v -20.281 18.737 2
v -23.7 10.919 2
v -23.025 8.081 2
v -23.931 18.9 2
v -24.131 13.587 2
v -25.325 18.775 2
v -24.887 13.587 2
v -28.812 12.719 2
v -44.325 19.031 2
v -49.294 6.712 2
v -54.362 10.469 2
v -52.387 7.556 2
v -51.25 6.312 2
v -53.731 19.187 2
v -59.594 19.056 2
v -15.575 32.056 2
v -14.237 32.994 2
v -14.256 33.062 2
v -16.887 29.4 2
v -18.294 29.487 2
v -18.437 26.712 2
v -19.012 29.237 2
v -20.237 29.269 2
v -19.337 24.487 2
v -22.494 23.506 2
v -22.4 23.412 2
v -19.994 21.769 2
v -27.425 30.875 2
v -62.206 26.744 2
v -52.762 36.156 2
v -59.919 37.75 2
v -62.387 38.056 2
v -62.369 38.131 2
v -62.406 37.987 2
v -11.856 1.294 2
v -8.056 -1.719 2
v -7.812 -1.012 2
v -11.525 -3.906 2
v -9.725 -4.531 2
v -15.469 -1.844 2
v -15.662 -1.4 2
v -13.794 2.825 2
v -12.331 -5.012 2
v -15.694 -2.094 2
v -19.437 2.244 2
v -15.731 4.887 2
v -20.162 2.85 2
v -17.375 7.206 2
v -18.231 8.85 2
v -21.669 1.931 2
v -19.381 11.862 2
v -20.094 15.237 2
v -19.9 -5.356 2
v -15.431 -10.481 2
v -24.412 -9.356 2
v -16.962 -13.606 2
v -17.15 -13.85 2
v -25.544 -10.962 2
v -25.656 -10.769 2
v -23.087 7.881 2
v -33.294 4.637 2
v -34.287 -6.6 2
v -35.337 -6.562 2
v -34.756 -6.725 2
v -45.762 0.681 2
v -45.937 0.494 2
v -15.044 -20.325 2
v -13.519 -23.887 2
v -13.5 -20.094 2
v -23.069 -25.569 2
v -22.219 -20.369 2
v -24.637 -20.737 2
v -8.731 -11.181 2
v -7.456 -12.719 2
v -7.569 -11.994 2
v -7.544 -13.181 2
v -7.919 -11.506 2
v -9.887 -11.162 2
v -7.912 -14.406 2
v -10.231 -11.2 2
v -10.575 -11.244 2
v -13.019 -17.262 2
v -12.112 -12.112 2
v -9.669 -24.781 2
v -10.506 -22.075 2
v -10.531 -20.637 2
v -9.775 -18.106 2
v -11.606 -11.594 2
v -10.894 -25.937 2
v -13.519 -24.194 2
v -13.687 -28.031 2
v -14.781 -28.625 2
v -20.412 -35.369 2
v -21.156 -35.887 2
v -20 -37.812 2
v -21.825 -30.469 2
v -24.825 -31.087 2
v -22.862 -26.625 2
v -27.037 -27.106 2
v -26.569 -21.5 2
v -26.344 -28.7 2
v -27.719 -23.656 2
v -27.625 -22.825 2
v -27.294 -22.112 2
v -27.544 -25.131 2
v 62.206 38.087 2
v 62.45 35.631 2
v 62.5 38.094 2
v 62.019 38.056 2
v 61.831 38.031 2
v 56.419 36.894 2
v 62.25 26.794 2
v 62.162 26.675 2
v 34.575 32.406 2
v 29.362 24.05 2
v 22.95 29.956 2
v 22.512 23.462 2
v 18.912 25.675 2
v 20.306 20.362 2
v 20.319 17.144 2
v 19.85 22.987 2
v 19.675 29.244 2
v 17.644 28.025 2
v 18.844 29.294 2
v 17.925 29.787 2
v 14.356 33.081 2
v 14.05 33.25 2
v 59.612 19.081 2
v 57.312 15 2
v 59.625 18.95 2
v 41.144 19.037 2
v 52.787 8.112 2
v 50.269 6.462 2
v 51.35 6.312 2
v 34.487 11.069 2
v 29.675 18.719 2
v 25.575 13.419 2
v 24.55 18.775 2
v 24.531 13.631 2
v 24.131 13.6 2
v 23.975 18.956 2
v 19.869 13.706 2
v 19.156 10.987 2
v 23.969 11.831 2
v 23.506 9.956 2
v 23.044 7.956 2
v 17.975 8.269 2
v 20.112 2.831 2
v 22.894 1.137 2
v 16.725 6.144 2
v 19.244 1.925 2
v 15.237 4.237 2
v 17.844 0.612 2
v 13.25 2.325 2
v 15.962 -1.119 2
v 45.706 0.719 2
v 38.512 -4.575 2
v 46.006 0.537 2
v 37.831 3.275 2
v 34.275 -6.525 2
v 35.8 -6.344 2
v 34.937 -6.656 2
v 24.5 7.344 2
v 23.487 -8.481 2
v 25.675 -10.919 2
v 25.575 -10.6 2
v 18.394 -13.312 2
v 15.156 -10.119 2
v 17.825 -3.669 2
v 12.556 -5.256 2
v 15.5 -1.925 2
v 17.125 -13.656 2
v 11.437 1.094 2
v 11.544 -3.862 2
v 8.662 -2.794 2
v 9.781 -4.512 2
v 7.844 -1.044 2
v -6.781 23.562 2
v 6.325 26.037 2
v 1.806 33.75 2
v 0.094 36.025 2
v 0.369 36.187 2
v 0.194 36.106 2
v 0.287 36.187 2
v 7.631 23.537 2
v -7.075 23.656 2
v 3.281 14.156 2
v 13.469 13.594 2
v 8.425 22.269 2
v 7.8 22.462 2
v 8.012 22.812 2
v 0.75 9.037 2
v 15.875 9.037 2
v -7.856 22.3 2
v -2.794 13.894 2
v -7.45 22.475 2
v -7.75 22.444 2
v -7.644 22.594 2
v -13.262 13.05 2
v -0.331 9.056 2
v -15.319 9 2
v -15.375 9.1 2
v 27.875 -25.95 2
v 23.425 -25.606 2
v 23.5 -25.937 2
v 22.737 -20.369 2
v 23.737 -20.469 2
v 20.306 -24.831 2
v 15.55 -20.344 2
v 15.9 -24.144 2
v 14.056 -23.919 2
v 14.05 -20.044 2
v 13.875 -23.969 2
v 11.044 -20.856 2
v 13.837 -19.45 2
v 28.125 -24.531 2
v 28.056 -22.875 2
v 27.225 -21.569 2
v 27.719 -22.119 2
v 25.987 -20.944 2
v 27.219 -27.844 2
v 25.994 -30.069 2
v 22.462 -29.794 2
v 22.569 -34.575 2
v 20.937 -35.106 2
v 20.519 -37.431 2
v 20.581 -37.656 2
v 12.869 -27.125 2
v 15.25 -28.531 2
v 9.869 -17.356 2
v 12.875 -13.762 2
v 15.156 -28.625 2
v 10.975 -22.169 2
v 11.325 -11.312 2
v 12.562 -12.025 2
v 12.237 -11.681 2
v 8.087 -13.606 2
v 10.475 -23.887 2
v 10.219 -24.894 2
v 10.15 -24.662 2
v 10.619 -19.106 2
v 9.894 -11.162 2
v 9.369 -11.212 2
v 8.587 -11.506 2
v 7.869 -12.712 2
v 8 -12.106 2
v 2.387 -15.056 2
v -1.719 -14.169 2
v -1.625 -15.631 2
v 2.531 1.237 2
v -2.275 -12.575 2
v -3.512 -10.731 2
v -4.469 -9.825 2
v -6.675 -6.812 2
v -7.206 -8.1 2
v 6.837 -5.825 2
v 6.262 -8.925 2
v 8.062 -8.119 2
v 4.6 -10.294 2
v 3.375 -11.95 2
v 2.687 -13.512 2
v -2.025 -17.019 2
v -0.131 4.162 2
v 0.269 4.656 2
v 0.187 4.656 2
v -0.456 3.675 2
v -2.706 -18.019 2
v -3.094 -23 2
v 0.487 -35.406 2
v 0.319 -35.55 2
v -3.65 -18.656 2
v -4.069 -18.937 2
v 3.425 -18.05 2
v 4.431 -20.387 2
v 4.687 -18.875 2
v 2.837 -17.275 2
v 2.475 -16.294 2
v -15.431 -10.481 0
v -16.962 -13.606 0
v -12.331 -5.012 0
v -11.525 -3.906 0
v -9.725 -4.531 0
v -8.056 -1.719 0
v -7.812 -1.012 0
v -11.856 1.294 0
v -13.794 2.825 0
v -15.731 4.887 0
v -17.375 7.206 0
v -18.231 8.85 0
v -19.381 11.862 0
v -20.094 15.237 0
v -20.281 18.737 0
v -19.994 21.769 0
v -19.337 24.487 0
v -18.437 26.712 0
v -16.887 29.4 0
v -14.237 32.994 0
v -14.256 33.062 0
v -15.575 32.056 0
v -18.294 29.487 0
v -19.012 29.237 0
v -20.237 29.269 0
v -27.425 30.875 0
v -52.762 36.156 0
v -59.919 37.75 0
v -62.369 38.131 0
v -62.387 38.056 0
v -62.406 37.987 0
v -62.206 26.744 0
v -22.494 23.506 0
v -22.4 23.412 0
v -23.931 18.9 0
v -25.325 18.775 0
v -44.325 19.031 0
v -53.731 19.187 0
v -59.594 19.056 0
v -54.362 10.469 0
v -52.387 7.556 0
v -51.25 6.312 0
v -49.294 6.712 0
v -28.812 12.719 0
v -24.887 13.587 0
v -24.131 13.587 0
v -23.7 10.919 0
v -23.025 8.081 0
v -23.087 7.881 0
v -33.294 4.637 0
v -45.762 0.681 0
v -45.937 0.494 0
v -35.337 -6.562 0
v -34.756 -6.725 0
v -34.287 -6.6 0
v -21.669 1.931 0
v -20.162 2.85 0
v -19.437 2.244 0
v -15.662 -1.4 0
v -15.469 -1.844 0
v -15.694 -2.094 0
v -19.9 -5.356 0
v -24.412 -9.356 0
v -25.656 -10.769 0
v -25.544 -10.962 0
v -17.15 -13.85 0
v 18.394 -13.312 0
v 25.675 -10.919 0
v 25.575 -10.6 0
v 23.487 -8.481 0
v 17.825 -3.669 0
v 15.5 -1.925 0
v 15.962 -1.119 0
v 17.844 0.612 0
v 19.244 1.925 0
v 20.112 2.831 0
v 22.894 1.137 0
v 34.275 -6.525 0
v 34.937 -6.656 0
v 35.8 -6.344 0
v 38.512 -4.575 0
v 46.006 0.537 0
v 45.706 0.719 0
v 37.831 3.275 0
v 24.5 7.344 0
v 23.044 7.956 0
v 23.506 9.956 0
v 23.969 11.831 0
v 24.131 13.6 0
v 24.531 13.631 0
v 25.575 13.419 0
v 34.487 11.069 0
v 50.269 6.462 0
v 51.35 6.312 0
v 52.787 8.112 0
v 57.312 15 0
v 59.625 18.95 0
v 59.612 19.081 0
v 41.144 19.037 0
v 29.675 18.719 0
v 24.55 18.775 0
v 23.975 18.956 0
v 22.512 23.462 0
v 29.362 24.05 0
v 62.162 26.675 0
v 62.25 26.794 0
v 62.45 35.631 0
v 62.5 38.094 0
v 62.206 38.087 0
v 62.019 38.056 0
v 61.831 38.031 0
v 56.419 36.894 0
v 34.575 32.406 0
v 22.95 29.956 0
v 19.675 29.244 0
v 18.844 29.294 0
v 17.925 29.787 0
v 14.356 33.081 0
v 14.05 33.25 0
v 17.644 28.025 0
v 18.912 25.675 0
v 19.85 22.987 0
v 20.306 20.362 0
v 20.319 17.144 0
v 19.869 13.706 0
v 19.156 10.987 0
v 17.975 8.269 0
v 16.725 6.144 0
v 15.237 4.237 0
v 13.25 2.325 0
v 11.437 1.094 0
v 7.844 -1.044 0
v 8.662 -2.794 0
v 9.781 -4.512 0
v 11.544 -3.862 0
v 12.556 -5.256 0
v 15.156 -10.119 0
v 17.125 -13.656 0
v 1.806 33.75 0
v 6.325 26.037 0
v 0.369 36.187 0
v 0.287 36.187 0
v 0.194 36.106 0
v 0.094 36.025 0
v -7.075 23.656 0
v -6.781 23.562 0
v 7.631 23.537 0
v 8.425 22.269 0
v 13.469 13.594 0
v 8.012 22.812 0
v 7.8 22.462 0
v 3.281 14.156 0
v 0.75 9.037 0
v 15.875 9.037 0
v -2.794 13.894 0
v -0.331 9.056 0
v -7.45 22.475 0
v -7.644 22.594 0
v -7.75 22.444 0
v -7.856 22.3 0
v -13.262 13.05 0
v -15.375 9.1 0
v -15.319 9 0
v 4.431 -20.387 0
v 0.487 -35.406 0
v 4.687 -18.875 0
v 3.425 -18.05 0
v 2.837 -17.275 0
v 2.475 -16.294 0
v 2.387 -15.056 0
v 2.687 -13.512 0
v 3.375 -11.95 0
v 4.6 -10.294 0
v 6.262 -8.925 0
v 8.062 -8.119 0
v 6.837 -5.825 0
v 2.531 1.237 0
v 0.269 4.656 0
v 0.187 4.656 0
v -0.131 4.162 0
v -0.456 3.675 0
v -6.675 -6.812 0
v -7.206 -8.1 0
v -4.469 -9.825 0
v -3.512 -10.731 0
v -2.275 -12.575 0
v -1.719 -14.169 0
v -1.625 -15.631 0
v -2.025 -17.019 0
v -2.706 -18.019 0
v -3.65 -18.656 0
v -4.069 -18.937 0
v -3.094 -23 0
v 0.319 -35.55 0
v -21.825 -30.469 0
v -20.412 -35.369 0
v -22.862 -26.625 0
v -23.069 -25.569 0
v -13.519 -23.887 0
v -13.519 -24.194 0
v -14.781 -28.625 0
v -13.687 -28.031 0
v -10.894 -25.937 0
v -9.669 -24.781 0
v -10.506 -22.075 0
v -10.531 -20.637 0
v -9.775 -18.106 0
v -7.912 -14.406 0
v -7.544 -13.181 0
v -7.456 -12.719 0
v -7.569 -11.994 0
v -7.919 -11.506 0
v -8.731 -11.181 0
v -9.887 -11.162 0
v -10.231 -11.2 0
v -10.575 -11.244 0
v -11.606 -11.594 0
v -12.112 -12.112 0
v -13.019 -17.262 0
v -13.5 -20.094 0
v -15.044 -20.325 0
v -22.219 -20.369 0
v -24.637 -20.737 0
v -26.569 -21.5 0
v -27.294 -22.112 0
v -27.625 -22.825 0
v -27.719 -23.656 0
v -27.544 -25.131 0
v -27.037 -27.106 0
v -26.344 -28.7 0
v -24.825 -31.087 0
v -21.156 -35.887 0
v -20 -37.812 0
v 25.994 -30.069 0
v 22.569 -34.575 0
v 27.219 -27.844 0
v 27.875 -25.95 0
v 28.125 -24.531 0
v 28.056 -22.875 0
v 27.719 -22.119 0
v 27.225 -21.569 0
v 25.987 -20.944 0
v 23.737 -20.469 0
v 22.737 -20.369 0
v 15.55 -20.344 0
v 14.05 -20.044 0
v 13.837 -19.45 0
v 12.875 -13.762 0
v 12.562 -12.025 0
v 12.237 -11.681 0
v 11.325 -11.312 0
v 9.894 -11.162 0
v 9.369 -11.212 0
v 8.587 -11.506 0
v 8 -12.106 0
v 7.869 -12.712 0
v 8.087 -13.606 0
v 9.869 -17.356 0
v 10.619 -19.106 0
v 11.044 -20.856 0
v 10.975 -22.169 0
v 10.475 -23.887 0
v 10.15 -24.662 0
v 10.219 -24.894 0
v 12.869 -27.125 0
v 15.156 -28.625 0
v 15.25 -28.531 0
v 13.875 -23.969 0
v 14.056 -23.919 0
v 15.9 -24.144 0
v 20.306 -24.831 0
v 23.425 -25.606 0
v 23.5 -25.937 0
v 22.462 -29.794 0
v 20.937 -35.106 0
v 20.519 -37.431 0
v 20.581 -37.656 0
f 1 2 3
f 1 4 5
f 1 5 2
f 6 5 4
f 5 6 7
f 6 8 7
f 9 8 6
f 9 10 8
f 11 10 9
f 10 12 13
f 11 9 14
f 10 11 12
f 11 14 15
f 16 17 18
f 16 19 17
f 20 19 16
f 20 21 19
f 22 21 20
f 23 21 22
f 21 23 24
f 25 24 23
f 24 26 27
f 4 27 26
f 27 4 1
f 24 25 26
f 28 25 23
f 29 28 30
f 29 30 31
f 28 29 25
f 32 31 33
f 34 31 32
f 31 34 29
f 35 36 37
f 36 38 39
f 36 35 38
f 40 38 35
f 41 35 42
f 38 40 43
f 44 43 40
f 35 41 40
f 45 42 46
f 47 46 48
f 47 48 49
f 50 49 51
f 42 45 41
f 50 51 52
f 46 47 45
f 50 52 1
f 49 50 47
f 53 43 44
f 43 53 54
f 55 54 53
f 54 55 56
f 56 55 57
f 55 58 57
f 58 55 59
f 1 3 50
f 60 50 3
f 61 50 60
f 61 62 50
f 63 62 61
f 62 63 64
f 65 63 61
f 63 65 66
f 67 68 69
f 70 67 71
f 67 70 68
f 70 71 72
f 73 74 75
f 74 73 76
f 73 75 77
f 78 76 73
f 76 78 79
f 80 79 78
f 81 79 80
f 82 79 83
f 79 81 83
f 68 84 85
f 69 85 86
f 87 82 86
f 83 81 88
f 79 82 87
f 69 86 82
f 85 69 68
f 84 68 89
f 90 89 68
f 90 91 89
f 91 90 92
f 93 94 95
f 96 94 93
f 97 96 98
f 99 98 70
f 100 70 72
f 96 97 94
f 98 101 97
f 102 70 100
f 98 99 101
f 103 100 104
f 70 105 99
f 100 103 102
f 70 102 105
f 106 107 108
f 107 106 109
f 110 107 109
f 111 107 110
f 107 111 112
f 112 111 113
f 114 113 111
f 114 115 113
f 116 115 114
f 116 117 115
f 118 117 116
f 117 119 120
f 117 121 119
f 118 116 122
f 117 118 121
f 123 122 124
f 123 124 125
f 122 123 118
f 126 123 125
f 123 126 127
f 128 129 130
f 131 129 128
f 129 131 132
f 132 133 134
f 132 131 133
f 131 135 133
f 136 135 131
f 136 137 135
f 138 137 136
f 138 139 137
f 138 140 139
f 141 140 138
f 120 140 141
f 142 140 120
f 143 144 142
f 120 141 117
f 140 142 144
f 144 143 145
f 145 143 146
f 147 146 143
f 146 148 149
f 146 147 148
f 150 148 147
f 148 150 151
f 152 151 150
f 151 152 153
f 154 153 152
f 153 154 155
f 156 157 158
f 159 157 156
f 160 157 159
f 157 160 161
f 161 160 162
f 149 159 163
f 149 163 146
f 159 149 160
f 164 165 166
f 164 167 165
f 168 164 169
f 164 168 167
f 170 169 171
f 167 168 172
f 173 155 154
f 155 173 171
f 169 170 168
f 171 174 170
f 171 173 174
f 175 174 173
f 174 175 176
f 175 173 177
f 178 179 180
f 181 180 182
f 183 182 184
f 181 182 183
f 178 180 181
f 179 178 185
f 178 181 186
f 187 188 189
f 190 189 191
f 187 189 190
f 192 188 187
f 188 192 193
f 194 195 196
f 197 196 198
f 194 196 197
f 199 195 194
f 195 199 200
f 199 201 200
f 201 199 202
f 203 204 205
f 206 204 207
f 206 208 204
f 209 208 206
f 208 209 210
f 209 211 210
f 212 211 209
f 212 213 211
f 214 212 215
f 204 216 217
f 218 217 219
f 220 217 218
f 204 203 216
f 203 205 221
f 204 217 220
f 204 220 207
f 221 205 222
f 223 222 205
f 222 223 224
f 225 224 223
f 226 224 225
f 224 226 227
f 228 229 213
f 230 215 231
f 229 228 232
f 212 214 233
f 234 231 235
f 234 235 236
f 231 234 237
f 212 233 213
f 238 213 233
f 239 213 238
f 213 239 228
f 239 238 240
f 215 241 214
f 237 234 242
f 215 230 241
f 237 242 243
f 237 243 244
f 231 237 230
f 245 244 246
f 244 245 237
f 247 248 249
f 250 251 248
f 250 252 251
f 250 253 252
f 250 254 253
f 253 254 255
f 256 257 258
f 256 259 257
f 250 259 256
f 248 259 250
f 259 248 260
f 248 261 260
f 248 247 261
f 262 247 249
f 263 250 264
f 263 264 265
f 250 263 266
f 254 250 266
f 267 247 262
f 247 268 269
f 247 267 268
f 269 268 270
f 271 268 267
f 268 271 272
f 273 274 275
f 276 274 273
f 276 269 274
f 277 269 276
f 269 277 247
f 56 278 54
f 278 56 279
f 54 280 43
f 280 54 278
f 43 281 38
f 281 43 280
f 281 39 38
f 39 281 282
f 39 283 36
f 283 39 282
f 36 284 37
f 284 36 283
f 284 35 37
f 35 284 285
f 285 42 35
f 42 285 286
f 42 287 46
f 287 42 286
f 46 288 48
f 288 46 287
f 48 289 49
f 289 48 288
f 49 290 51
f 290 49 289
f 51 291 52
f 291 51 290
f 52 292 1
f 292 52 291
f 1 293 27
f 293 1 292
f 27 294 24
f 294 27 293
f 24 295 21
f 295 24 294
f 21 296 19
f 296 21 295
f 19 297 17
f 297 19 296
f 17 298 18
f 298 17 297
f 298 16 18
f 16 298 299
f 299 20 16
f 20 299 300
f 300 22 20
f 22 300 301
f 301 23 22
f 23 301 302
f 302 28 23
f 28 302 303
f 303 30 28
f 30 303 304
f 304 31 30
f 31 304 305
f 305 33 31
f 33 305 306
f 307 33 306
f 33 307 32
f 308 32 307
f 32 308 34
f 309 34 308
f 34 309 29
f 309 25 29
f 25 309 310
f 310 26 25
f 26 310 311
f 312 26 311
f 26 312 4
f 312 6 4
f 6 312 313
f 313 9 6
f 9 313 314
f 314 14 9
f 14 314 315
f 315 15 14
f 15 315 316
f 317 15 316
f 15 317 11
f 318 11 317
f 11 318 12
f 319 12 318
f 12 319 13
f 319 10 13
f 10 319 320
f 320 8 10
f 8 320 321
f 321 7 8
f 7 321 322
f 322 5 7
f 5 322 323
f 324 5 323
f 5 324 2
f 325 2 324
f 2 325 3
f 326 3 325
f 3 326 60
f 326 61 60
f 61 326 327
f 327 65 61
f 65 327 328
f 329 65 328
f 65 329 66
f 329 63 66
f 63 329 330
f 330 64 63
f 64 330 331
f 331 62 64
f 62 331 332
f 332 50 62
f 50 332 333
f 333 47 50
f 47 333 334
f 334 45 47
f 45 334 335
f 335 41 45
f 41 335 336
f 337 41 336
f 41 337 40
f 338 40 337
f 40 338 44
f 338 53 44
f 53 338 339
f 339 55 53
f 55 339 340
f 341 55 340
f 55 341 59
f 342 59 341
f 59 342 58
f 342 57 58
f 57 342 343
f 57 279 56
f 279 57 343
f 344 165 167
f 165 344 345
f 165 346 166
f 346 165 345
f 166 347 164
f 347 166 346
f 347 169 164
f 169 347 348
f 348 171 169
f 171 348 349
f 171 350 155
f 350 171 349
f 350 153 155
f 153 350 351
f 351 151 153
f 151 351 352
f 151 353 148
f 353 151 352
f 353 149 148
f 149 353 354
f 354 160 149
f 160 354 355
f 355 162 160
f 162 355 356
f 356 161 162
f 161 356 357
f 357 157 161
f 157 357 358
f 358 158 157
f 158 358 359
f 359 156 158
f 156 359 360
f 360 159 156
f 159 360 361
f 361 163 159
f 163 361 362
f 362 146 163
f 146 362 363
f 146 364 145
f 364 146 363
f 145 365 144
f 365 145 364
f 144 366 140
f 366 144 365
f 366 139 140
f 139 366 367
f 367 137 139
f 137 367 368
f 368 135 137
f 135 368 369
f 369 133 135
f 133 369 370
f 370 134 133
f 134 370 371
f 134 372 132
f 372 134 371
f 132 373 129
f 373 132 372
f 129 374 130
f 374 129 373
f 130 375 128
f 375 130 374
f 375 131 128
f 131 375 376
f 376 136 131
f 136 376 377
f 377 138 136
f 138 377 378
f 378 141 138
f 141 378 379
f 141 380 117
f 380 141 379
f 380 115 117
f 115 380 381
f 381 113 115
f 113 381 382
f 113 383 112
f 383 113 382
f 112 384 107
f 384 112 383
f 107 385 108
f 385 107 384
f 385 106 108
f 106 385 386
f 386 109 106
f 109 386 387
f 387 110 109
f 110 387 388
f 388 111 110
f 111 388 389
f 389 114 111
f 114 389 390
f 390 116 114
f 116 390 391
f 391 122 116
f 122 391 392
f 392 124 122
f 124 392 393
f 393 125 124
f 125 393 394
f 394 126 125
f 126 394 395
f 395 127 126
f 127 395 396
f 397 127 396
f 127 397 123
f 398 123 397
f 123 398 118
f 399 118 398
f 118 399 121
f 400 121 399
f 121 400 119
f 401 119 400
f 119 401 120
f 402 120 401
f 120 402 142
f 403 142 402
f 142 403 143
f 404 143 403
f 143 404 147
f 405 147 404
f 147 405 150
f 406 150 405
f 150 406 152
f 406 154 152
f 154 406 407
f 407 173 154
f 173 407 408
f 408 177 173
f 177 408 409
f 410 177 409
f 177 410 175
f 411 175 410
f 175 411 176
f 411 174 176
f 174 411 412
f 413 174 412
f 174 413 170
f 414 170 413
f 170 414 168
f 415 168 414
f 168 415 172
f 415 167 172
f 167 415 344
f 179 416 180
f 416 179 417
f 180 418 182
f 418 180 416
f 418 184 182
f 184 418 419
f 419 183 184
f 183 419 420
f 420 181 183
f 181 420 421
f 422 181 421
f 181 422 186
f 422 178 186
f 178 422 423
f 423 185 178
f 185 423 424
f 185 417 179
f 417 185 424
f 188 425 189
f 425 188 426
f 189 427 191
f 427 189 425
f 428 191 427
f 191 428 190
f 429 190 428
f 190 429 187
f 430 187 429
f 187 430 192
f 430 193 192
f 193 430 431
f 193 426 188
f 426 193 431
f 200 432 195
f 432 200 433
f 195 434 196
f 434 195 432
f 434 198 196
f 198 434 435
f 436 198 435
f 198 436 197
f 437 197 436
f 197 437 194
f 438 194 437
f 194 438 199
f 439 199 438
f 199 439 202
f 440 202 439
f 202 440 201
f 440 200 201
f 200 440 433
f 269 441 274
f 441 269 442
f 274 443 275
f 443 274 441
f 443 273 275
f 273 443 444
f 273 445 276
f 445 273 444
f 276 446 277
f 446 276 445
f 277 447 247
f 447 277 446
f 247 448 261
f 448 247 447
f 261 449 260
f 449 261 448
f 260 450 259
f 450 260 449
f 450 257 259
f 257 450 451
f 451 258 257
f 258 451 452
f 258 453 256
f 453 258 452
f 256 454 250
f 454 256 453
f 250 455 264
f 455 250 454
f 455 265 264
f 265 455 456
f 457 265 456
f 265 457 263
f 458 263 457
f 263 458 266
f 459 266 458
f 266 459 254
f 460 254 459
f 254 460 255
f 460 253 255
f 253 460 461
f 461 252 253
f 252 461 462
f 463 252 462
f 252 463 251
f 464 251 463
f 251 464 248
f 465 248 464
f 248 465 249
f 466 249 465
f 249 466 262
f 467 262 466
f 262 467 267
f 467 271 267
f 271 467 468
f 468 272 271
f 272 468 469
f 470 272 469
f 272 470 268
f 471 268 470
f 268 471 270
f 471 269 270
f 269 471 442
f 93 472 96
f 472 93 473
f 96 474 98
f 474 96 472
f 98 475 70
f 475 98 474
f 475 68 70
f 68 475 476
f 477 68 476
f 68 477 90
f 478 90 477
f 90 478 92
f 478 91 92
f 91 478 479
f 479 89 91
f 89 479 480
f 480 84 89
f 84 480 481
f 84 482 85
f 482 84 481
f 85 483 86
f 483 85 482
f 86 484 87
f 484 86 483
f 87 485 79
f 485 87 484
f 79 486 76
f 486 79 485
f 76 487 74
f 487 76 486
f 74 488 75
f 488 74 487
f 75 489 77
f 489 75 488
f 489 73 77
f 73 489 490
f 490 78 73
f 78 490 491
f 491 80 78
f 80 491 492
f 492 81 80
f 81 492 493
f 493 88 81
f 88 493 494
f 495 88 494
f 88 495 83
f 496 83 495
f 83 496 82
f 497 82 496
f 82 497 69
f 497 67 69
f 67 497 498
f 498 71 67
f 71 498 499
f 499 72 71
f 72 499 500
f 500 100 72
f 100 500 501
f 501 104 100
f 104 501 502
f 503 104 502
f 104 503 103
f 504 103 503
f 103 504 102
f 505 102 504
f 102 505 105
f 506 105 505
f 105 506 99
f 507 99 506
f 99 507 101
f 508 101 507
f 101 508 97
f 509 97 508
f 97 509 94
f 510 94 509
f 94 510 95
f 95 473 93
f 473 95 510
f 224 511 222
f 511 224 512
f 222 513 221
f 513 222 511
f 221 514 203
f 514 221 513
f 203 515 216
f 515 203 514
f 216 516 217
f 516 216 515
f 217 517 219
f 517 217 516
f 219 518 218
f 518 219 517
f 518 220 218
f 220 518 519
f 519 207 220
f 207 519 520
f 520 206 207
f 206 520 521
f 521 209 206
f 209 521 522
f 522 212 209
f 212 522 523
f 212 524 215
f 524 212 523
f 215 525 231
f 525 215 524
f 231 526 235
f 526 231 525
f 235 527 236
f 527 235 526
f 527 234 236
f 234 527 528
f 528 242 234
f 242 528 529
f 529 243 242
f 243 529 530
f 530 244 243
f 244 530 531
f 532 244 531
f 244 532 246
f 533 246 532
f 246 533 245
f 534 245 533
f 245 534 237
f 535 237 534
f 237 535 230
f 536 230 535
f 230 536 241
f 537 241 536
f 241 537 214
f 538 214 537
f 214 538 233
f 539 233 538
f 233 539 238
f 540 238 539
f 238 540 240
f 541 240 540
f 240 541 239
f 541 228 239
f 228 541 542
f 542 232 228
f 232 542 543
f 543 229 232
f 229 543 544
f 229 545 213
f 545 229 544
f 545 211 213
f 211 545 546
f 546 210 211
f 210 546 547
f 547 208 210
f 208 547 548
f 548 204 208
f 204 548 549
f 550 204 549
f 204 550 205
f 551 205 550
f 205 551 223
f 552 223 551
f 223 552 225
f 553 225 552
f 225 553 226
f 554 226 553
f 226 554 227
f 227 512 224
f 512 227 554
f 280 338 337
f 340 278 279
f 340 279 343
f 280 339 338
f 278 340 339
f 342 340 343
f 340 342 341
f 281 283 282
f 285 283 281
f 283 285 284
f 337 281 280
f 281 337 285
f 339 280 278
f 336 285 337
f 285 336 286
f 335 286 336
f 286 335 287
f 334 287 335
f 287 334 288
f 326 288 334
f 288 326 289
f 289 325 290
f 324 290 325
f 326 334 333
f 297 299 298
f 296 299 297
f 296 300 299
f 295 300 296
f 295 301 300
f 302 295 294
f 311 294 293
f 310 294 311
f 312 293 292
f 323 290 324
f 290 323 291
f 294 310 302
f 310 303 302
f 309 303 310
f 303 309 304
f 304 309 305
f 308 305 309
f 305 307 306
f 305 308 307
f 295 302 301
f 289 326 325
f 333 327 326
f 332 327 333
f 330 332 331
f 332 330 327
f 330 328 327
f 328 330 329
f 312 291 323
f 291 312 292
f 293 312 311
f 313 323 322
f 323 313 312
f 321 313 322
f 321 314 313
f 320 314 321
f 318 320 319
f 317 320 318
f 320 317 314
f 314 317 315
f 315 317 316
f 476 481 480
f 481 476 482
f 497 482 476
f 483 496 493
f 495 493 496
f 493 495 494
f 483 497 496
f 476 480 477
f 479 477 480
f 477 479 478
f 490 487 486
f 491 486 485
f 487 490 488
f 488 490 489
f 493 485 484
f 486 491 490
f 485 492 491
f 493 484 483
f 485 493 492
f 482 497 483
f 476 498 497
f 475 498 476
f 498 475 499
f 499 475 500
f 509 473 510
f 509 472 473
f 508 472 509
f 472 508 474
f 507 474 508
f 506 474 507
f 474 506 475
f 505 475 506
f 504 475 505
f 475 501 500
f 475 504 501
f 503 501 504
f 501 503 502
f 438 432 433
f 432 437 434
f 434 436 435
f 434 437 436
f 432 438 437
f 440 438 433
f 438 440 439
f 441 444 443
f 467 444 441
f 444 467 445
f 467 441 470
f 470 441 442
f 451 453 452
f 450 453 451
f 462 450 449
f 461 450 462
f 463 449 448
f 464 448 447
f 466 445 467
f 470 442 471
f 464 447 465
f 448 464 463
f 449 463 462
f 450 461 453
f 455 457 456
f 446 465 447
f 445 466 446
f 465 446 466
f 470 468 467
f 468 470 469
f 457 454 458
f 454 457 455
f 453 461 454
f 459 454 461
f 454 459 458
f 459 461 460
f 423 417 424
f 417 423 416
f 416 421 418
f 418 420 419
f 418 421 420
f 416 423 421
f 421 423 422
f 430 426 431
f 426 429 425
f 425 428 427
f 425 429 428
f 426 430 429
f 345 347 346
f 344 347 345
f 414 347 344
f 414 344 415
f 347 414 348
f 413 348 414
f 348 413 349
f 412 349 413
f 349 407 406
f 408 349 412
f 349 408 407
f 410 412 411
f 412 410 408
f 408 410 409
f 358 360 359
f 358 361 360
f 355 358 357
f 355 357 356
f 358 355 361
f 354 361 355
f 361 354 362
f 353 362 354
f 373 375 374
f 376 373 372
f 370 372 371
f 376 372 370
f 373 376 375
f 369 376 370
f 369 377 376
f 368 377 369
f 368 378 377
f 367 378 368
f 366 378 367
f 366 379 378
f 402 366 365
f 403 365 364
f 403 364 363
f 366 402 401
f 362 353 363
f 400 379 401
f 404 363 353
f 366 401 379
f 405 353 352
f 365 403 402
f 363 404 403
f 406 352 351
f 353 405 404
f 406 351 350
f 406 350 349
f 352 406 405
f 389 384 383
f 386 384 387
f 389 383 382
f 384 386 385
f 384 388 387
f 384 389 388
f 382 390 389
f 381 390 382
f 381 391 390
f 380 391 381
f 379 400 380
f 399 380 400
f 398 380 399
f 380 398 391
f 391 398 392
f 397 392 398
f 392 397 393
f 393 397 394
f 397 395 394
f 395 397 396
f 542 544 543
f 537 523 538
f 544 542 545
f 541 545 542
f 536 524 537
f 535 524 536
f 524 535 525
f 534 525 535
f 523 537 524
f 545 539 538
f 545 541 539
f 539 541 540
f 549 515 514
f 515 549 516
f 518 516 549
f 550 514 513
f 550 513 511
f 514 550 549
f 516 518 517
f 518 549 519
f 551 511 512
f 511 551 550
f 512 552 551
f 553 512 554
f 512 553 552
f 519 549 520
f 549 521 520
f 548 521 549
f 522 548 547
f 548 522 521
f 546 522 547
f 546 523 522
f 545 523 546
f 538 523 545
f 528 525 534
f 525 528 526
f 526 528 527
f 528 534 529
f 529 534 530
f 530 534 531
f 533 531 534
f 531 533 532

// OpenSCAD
module 24a7268b396f16691b9d0fd64674e458_1()
{
 /* Generated by trace2scad version 20150415
    http://aggregate.org/MAKE/TRACE2SCAD/
    Optimized model has 279/3846 original points
 */
 color([0.48, 0.48, 0.48])
 assign(minx=0) /* polygon minx=15 */
 assign(miny=0) /* polygon miny=75 */
 assign(maxx=20000) /* polygon maxx=20000 */
 assign(maxy=12250) /* polygon maxy=12226 */
 assign(dx=maxx-minx)
 assign(dy=maxy-miny)
 assign(maxd=((dx>dy)?dx:dy))
 scale([1/maxd, 1/maxd, 1])
 translate([-minx-dx/2, -miny-dy/2, 0])
 linear_extrude(height=1, convexity=279)
 union() {
  union() {
   polygon([[18,12214],[15,12203],[47,10404],[6401,9886],[6416,9871],[6171,9149],[5948,9129],[2908,9170],[1403,9195],[465,9174],[1302,7800],[1618,7334],[1800,7135],[2113,7199],[5390,8160],[6018,8299],[6139,8299],[6208,7872],[6316,7418],[6306,7386],[4673,6867],[2678,6234],[2650,6204],[4346,5075],[4439,5049],[4514,5069],[6533,6434],[6774,6581],[6890,6484],[7494,5901],[7525,5830],[7489,5790],[6816,5268],[6094,4628],[5895,4402],[5913,4371],[7256,3909],[7286,3948],[7531,4448],[8027,5323],[8156,5500],[8444,5400],[8711,5850],[8750,5963],[8103,6332],[7793,6577],[7483,6907],[7220,7278],[7083,7541],[6899,8023],[6785,8563],[6755,9123],[6801,9608],[6906,10043],[7050,10399],[7298,10829],[7722,11404],[7719,11415],[7508,11254],[7073,10843],[6958,10803],[6762,10808],[5612,11065],[1558,11910],[413,12165],[21,12226]], convexity=24);
   polygon([[19923,12214],[19893,12210],[19027,12028],[15532,11310],[13672,10918],[13148,10804],[13015,10812],[12868,10891],[12297,11418],[12248,11445],[12823,10609],[13026,10233],[13176,9803],[13249,9383],[13251,8868],[13179,8318],[13065,7883],[12876,7448],[12676,7108],[12438,6803],[12120,6497],[11830,6300],[11255,5958],[11386,5678],[11565,5403],[11847,5507],[12009,5284],[12425,4506],[12740,3940],[12943,3995],[14108,4378],[14092,4429],[13758,4768],[12852,5538],[12480,5817],[12554,5946],[12855,6223],[13079,6433],[13218,6578],[13663,6307],[15484,5081],[15590,5060],[15728,5110],[16162,5393],[17361,6211],[17313,6240],[16053,6649],[13920,7300],[13687,7398],[13761,7718],[13835,8018],[13861,8301],[13925,8306],[14092,8272],[15518,7896],[18043,7159],[18216,7135],[18446,7423],[19170,8525],[19540,9157],[19538,9178],[16583,9171],[14748,9120],[13928,9129],[13836,9158],[13602,9879],[14698,9973],[19946,10393],[19960,10412],[19992,11826],[20000,12220],[19953,12219]], convexity=23);
   polygon([[10031,11902],[10015,11889],[8868,9910],[8915,9895],[11221,9891],[11012,10291],[10289,11525],[10059,11915],[10046,11915]], convexity=5);
   polygon([[11265,9747],[11248,9719],[10525,8390],[10120,7571],[12540,7571],[12155,8300],[11348,9688],[11282,9775]], convexity=5);
   polygon([[8760,9716],[8743,9693],[7878,8213],[7540,7581],[7549,7565],[9947,7574],[9553,8348],[8808,9721],[8777,9740]], convexity=6);
   polygon([[9979,6791],[9927,6713],[8932,5035],[8847,4829],[9285,4553],[9438,4408],[9636,4113],[9725,3858],[9740,3624],[9676,3402],[9567,3242],[9416,3140],[9349,3095],[9505,2445],[10051,437],[10078,460],[10709,2863],[10750,3105],[10548,3237],[10454,3361],[10396,3518],[10382,3716],[10430,3963],[10540,4213],[10736,4478],[11002,4697],[11290,4826],[11094,5193],[10405,6323],[10043,6870],[10030,6870]], convexity=10);
   polygon([[8363,4333],[8308,4326],[8143,4270],[8062,4187],[7917,3363],[7840,2910],[7593,2873],[6445,2866],[6058,2807],[5749,2685],[5633,2587],[5580,2473],[5565,2340],[5593,2104],[5674,1788],[5785,1533],[6028,1151],[6615,383],[6800,75],[6734,466],[6508,1250],[6342,1865],[6309,2034],[7837,2303],[7837,2254],[7635,1545],[7810,1640],[8257,1975],[8453,2160],[8319,2593],[8315,2823],[8436,3228],[8734,3820],[8793,4016],[8807,4090],[8789,4206],[8733,4284],[8603,4336],[8418,4339]], convexity=12);
   polygon([[11541,4335],[11499,4331],[11374,4284],[11280,4188],[11259,4091],[11294,3948],[11579,3348],[11699,3068],[11767,2788],[11756,2578],[11676,2303],[11624,2179],[11635,2142],[12059,1785],[12425,1545],[12440,1560],[12220,2290],[12249,2298],[12544,2262],[13249,2152],[13748,2028],[13760,1975],[13594,1358],[13350,508],[13283,136],[13293,100],[13611,593],[14159,1314],[14355,1670],[14460,1973],[14500,2200],[14489,2465],[14435,2586],[14356,2674],[14158,2774],[13798,2850],[13638,2866],[12488,2870],[12248,2918],[12214,3013],[12060,3923],[12010,4201],[11958,4256],[11812,4315],[11583,4339]], convexity=14);
  }
 }
}

module 24a7268b396f16691b9d0fd64674e458()
{
 /* all layers combined, scaled to within a 1mm cube */
 scale([1, 1, 1/1])
 difference() {
  union() {
   scale([1,1,2]) translate([0,0,-0.5]) 24a7268b396f16691b9d0fd64674e458_1();
  }
  translate([0,0,-2]) cube([2,2,4],center=true);
 }
}

scale([125, 125, 2]) {
	24a7268b396f16691b9d0fd64674e458();
}
